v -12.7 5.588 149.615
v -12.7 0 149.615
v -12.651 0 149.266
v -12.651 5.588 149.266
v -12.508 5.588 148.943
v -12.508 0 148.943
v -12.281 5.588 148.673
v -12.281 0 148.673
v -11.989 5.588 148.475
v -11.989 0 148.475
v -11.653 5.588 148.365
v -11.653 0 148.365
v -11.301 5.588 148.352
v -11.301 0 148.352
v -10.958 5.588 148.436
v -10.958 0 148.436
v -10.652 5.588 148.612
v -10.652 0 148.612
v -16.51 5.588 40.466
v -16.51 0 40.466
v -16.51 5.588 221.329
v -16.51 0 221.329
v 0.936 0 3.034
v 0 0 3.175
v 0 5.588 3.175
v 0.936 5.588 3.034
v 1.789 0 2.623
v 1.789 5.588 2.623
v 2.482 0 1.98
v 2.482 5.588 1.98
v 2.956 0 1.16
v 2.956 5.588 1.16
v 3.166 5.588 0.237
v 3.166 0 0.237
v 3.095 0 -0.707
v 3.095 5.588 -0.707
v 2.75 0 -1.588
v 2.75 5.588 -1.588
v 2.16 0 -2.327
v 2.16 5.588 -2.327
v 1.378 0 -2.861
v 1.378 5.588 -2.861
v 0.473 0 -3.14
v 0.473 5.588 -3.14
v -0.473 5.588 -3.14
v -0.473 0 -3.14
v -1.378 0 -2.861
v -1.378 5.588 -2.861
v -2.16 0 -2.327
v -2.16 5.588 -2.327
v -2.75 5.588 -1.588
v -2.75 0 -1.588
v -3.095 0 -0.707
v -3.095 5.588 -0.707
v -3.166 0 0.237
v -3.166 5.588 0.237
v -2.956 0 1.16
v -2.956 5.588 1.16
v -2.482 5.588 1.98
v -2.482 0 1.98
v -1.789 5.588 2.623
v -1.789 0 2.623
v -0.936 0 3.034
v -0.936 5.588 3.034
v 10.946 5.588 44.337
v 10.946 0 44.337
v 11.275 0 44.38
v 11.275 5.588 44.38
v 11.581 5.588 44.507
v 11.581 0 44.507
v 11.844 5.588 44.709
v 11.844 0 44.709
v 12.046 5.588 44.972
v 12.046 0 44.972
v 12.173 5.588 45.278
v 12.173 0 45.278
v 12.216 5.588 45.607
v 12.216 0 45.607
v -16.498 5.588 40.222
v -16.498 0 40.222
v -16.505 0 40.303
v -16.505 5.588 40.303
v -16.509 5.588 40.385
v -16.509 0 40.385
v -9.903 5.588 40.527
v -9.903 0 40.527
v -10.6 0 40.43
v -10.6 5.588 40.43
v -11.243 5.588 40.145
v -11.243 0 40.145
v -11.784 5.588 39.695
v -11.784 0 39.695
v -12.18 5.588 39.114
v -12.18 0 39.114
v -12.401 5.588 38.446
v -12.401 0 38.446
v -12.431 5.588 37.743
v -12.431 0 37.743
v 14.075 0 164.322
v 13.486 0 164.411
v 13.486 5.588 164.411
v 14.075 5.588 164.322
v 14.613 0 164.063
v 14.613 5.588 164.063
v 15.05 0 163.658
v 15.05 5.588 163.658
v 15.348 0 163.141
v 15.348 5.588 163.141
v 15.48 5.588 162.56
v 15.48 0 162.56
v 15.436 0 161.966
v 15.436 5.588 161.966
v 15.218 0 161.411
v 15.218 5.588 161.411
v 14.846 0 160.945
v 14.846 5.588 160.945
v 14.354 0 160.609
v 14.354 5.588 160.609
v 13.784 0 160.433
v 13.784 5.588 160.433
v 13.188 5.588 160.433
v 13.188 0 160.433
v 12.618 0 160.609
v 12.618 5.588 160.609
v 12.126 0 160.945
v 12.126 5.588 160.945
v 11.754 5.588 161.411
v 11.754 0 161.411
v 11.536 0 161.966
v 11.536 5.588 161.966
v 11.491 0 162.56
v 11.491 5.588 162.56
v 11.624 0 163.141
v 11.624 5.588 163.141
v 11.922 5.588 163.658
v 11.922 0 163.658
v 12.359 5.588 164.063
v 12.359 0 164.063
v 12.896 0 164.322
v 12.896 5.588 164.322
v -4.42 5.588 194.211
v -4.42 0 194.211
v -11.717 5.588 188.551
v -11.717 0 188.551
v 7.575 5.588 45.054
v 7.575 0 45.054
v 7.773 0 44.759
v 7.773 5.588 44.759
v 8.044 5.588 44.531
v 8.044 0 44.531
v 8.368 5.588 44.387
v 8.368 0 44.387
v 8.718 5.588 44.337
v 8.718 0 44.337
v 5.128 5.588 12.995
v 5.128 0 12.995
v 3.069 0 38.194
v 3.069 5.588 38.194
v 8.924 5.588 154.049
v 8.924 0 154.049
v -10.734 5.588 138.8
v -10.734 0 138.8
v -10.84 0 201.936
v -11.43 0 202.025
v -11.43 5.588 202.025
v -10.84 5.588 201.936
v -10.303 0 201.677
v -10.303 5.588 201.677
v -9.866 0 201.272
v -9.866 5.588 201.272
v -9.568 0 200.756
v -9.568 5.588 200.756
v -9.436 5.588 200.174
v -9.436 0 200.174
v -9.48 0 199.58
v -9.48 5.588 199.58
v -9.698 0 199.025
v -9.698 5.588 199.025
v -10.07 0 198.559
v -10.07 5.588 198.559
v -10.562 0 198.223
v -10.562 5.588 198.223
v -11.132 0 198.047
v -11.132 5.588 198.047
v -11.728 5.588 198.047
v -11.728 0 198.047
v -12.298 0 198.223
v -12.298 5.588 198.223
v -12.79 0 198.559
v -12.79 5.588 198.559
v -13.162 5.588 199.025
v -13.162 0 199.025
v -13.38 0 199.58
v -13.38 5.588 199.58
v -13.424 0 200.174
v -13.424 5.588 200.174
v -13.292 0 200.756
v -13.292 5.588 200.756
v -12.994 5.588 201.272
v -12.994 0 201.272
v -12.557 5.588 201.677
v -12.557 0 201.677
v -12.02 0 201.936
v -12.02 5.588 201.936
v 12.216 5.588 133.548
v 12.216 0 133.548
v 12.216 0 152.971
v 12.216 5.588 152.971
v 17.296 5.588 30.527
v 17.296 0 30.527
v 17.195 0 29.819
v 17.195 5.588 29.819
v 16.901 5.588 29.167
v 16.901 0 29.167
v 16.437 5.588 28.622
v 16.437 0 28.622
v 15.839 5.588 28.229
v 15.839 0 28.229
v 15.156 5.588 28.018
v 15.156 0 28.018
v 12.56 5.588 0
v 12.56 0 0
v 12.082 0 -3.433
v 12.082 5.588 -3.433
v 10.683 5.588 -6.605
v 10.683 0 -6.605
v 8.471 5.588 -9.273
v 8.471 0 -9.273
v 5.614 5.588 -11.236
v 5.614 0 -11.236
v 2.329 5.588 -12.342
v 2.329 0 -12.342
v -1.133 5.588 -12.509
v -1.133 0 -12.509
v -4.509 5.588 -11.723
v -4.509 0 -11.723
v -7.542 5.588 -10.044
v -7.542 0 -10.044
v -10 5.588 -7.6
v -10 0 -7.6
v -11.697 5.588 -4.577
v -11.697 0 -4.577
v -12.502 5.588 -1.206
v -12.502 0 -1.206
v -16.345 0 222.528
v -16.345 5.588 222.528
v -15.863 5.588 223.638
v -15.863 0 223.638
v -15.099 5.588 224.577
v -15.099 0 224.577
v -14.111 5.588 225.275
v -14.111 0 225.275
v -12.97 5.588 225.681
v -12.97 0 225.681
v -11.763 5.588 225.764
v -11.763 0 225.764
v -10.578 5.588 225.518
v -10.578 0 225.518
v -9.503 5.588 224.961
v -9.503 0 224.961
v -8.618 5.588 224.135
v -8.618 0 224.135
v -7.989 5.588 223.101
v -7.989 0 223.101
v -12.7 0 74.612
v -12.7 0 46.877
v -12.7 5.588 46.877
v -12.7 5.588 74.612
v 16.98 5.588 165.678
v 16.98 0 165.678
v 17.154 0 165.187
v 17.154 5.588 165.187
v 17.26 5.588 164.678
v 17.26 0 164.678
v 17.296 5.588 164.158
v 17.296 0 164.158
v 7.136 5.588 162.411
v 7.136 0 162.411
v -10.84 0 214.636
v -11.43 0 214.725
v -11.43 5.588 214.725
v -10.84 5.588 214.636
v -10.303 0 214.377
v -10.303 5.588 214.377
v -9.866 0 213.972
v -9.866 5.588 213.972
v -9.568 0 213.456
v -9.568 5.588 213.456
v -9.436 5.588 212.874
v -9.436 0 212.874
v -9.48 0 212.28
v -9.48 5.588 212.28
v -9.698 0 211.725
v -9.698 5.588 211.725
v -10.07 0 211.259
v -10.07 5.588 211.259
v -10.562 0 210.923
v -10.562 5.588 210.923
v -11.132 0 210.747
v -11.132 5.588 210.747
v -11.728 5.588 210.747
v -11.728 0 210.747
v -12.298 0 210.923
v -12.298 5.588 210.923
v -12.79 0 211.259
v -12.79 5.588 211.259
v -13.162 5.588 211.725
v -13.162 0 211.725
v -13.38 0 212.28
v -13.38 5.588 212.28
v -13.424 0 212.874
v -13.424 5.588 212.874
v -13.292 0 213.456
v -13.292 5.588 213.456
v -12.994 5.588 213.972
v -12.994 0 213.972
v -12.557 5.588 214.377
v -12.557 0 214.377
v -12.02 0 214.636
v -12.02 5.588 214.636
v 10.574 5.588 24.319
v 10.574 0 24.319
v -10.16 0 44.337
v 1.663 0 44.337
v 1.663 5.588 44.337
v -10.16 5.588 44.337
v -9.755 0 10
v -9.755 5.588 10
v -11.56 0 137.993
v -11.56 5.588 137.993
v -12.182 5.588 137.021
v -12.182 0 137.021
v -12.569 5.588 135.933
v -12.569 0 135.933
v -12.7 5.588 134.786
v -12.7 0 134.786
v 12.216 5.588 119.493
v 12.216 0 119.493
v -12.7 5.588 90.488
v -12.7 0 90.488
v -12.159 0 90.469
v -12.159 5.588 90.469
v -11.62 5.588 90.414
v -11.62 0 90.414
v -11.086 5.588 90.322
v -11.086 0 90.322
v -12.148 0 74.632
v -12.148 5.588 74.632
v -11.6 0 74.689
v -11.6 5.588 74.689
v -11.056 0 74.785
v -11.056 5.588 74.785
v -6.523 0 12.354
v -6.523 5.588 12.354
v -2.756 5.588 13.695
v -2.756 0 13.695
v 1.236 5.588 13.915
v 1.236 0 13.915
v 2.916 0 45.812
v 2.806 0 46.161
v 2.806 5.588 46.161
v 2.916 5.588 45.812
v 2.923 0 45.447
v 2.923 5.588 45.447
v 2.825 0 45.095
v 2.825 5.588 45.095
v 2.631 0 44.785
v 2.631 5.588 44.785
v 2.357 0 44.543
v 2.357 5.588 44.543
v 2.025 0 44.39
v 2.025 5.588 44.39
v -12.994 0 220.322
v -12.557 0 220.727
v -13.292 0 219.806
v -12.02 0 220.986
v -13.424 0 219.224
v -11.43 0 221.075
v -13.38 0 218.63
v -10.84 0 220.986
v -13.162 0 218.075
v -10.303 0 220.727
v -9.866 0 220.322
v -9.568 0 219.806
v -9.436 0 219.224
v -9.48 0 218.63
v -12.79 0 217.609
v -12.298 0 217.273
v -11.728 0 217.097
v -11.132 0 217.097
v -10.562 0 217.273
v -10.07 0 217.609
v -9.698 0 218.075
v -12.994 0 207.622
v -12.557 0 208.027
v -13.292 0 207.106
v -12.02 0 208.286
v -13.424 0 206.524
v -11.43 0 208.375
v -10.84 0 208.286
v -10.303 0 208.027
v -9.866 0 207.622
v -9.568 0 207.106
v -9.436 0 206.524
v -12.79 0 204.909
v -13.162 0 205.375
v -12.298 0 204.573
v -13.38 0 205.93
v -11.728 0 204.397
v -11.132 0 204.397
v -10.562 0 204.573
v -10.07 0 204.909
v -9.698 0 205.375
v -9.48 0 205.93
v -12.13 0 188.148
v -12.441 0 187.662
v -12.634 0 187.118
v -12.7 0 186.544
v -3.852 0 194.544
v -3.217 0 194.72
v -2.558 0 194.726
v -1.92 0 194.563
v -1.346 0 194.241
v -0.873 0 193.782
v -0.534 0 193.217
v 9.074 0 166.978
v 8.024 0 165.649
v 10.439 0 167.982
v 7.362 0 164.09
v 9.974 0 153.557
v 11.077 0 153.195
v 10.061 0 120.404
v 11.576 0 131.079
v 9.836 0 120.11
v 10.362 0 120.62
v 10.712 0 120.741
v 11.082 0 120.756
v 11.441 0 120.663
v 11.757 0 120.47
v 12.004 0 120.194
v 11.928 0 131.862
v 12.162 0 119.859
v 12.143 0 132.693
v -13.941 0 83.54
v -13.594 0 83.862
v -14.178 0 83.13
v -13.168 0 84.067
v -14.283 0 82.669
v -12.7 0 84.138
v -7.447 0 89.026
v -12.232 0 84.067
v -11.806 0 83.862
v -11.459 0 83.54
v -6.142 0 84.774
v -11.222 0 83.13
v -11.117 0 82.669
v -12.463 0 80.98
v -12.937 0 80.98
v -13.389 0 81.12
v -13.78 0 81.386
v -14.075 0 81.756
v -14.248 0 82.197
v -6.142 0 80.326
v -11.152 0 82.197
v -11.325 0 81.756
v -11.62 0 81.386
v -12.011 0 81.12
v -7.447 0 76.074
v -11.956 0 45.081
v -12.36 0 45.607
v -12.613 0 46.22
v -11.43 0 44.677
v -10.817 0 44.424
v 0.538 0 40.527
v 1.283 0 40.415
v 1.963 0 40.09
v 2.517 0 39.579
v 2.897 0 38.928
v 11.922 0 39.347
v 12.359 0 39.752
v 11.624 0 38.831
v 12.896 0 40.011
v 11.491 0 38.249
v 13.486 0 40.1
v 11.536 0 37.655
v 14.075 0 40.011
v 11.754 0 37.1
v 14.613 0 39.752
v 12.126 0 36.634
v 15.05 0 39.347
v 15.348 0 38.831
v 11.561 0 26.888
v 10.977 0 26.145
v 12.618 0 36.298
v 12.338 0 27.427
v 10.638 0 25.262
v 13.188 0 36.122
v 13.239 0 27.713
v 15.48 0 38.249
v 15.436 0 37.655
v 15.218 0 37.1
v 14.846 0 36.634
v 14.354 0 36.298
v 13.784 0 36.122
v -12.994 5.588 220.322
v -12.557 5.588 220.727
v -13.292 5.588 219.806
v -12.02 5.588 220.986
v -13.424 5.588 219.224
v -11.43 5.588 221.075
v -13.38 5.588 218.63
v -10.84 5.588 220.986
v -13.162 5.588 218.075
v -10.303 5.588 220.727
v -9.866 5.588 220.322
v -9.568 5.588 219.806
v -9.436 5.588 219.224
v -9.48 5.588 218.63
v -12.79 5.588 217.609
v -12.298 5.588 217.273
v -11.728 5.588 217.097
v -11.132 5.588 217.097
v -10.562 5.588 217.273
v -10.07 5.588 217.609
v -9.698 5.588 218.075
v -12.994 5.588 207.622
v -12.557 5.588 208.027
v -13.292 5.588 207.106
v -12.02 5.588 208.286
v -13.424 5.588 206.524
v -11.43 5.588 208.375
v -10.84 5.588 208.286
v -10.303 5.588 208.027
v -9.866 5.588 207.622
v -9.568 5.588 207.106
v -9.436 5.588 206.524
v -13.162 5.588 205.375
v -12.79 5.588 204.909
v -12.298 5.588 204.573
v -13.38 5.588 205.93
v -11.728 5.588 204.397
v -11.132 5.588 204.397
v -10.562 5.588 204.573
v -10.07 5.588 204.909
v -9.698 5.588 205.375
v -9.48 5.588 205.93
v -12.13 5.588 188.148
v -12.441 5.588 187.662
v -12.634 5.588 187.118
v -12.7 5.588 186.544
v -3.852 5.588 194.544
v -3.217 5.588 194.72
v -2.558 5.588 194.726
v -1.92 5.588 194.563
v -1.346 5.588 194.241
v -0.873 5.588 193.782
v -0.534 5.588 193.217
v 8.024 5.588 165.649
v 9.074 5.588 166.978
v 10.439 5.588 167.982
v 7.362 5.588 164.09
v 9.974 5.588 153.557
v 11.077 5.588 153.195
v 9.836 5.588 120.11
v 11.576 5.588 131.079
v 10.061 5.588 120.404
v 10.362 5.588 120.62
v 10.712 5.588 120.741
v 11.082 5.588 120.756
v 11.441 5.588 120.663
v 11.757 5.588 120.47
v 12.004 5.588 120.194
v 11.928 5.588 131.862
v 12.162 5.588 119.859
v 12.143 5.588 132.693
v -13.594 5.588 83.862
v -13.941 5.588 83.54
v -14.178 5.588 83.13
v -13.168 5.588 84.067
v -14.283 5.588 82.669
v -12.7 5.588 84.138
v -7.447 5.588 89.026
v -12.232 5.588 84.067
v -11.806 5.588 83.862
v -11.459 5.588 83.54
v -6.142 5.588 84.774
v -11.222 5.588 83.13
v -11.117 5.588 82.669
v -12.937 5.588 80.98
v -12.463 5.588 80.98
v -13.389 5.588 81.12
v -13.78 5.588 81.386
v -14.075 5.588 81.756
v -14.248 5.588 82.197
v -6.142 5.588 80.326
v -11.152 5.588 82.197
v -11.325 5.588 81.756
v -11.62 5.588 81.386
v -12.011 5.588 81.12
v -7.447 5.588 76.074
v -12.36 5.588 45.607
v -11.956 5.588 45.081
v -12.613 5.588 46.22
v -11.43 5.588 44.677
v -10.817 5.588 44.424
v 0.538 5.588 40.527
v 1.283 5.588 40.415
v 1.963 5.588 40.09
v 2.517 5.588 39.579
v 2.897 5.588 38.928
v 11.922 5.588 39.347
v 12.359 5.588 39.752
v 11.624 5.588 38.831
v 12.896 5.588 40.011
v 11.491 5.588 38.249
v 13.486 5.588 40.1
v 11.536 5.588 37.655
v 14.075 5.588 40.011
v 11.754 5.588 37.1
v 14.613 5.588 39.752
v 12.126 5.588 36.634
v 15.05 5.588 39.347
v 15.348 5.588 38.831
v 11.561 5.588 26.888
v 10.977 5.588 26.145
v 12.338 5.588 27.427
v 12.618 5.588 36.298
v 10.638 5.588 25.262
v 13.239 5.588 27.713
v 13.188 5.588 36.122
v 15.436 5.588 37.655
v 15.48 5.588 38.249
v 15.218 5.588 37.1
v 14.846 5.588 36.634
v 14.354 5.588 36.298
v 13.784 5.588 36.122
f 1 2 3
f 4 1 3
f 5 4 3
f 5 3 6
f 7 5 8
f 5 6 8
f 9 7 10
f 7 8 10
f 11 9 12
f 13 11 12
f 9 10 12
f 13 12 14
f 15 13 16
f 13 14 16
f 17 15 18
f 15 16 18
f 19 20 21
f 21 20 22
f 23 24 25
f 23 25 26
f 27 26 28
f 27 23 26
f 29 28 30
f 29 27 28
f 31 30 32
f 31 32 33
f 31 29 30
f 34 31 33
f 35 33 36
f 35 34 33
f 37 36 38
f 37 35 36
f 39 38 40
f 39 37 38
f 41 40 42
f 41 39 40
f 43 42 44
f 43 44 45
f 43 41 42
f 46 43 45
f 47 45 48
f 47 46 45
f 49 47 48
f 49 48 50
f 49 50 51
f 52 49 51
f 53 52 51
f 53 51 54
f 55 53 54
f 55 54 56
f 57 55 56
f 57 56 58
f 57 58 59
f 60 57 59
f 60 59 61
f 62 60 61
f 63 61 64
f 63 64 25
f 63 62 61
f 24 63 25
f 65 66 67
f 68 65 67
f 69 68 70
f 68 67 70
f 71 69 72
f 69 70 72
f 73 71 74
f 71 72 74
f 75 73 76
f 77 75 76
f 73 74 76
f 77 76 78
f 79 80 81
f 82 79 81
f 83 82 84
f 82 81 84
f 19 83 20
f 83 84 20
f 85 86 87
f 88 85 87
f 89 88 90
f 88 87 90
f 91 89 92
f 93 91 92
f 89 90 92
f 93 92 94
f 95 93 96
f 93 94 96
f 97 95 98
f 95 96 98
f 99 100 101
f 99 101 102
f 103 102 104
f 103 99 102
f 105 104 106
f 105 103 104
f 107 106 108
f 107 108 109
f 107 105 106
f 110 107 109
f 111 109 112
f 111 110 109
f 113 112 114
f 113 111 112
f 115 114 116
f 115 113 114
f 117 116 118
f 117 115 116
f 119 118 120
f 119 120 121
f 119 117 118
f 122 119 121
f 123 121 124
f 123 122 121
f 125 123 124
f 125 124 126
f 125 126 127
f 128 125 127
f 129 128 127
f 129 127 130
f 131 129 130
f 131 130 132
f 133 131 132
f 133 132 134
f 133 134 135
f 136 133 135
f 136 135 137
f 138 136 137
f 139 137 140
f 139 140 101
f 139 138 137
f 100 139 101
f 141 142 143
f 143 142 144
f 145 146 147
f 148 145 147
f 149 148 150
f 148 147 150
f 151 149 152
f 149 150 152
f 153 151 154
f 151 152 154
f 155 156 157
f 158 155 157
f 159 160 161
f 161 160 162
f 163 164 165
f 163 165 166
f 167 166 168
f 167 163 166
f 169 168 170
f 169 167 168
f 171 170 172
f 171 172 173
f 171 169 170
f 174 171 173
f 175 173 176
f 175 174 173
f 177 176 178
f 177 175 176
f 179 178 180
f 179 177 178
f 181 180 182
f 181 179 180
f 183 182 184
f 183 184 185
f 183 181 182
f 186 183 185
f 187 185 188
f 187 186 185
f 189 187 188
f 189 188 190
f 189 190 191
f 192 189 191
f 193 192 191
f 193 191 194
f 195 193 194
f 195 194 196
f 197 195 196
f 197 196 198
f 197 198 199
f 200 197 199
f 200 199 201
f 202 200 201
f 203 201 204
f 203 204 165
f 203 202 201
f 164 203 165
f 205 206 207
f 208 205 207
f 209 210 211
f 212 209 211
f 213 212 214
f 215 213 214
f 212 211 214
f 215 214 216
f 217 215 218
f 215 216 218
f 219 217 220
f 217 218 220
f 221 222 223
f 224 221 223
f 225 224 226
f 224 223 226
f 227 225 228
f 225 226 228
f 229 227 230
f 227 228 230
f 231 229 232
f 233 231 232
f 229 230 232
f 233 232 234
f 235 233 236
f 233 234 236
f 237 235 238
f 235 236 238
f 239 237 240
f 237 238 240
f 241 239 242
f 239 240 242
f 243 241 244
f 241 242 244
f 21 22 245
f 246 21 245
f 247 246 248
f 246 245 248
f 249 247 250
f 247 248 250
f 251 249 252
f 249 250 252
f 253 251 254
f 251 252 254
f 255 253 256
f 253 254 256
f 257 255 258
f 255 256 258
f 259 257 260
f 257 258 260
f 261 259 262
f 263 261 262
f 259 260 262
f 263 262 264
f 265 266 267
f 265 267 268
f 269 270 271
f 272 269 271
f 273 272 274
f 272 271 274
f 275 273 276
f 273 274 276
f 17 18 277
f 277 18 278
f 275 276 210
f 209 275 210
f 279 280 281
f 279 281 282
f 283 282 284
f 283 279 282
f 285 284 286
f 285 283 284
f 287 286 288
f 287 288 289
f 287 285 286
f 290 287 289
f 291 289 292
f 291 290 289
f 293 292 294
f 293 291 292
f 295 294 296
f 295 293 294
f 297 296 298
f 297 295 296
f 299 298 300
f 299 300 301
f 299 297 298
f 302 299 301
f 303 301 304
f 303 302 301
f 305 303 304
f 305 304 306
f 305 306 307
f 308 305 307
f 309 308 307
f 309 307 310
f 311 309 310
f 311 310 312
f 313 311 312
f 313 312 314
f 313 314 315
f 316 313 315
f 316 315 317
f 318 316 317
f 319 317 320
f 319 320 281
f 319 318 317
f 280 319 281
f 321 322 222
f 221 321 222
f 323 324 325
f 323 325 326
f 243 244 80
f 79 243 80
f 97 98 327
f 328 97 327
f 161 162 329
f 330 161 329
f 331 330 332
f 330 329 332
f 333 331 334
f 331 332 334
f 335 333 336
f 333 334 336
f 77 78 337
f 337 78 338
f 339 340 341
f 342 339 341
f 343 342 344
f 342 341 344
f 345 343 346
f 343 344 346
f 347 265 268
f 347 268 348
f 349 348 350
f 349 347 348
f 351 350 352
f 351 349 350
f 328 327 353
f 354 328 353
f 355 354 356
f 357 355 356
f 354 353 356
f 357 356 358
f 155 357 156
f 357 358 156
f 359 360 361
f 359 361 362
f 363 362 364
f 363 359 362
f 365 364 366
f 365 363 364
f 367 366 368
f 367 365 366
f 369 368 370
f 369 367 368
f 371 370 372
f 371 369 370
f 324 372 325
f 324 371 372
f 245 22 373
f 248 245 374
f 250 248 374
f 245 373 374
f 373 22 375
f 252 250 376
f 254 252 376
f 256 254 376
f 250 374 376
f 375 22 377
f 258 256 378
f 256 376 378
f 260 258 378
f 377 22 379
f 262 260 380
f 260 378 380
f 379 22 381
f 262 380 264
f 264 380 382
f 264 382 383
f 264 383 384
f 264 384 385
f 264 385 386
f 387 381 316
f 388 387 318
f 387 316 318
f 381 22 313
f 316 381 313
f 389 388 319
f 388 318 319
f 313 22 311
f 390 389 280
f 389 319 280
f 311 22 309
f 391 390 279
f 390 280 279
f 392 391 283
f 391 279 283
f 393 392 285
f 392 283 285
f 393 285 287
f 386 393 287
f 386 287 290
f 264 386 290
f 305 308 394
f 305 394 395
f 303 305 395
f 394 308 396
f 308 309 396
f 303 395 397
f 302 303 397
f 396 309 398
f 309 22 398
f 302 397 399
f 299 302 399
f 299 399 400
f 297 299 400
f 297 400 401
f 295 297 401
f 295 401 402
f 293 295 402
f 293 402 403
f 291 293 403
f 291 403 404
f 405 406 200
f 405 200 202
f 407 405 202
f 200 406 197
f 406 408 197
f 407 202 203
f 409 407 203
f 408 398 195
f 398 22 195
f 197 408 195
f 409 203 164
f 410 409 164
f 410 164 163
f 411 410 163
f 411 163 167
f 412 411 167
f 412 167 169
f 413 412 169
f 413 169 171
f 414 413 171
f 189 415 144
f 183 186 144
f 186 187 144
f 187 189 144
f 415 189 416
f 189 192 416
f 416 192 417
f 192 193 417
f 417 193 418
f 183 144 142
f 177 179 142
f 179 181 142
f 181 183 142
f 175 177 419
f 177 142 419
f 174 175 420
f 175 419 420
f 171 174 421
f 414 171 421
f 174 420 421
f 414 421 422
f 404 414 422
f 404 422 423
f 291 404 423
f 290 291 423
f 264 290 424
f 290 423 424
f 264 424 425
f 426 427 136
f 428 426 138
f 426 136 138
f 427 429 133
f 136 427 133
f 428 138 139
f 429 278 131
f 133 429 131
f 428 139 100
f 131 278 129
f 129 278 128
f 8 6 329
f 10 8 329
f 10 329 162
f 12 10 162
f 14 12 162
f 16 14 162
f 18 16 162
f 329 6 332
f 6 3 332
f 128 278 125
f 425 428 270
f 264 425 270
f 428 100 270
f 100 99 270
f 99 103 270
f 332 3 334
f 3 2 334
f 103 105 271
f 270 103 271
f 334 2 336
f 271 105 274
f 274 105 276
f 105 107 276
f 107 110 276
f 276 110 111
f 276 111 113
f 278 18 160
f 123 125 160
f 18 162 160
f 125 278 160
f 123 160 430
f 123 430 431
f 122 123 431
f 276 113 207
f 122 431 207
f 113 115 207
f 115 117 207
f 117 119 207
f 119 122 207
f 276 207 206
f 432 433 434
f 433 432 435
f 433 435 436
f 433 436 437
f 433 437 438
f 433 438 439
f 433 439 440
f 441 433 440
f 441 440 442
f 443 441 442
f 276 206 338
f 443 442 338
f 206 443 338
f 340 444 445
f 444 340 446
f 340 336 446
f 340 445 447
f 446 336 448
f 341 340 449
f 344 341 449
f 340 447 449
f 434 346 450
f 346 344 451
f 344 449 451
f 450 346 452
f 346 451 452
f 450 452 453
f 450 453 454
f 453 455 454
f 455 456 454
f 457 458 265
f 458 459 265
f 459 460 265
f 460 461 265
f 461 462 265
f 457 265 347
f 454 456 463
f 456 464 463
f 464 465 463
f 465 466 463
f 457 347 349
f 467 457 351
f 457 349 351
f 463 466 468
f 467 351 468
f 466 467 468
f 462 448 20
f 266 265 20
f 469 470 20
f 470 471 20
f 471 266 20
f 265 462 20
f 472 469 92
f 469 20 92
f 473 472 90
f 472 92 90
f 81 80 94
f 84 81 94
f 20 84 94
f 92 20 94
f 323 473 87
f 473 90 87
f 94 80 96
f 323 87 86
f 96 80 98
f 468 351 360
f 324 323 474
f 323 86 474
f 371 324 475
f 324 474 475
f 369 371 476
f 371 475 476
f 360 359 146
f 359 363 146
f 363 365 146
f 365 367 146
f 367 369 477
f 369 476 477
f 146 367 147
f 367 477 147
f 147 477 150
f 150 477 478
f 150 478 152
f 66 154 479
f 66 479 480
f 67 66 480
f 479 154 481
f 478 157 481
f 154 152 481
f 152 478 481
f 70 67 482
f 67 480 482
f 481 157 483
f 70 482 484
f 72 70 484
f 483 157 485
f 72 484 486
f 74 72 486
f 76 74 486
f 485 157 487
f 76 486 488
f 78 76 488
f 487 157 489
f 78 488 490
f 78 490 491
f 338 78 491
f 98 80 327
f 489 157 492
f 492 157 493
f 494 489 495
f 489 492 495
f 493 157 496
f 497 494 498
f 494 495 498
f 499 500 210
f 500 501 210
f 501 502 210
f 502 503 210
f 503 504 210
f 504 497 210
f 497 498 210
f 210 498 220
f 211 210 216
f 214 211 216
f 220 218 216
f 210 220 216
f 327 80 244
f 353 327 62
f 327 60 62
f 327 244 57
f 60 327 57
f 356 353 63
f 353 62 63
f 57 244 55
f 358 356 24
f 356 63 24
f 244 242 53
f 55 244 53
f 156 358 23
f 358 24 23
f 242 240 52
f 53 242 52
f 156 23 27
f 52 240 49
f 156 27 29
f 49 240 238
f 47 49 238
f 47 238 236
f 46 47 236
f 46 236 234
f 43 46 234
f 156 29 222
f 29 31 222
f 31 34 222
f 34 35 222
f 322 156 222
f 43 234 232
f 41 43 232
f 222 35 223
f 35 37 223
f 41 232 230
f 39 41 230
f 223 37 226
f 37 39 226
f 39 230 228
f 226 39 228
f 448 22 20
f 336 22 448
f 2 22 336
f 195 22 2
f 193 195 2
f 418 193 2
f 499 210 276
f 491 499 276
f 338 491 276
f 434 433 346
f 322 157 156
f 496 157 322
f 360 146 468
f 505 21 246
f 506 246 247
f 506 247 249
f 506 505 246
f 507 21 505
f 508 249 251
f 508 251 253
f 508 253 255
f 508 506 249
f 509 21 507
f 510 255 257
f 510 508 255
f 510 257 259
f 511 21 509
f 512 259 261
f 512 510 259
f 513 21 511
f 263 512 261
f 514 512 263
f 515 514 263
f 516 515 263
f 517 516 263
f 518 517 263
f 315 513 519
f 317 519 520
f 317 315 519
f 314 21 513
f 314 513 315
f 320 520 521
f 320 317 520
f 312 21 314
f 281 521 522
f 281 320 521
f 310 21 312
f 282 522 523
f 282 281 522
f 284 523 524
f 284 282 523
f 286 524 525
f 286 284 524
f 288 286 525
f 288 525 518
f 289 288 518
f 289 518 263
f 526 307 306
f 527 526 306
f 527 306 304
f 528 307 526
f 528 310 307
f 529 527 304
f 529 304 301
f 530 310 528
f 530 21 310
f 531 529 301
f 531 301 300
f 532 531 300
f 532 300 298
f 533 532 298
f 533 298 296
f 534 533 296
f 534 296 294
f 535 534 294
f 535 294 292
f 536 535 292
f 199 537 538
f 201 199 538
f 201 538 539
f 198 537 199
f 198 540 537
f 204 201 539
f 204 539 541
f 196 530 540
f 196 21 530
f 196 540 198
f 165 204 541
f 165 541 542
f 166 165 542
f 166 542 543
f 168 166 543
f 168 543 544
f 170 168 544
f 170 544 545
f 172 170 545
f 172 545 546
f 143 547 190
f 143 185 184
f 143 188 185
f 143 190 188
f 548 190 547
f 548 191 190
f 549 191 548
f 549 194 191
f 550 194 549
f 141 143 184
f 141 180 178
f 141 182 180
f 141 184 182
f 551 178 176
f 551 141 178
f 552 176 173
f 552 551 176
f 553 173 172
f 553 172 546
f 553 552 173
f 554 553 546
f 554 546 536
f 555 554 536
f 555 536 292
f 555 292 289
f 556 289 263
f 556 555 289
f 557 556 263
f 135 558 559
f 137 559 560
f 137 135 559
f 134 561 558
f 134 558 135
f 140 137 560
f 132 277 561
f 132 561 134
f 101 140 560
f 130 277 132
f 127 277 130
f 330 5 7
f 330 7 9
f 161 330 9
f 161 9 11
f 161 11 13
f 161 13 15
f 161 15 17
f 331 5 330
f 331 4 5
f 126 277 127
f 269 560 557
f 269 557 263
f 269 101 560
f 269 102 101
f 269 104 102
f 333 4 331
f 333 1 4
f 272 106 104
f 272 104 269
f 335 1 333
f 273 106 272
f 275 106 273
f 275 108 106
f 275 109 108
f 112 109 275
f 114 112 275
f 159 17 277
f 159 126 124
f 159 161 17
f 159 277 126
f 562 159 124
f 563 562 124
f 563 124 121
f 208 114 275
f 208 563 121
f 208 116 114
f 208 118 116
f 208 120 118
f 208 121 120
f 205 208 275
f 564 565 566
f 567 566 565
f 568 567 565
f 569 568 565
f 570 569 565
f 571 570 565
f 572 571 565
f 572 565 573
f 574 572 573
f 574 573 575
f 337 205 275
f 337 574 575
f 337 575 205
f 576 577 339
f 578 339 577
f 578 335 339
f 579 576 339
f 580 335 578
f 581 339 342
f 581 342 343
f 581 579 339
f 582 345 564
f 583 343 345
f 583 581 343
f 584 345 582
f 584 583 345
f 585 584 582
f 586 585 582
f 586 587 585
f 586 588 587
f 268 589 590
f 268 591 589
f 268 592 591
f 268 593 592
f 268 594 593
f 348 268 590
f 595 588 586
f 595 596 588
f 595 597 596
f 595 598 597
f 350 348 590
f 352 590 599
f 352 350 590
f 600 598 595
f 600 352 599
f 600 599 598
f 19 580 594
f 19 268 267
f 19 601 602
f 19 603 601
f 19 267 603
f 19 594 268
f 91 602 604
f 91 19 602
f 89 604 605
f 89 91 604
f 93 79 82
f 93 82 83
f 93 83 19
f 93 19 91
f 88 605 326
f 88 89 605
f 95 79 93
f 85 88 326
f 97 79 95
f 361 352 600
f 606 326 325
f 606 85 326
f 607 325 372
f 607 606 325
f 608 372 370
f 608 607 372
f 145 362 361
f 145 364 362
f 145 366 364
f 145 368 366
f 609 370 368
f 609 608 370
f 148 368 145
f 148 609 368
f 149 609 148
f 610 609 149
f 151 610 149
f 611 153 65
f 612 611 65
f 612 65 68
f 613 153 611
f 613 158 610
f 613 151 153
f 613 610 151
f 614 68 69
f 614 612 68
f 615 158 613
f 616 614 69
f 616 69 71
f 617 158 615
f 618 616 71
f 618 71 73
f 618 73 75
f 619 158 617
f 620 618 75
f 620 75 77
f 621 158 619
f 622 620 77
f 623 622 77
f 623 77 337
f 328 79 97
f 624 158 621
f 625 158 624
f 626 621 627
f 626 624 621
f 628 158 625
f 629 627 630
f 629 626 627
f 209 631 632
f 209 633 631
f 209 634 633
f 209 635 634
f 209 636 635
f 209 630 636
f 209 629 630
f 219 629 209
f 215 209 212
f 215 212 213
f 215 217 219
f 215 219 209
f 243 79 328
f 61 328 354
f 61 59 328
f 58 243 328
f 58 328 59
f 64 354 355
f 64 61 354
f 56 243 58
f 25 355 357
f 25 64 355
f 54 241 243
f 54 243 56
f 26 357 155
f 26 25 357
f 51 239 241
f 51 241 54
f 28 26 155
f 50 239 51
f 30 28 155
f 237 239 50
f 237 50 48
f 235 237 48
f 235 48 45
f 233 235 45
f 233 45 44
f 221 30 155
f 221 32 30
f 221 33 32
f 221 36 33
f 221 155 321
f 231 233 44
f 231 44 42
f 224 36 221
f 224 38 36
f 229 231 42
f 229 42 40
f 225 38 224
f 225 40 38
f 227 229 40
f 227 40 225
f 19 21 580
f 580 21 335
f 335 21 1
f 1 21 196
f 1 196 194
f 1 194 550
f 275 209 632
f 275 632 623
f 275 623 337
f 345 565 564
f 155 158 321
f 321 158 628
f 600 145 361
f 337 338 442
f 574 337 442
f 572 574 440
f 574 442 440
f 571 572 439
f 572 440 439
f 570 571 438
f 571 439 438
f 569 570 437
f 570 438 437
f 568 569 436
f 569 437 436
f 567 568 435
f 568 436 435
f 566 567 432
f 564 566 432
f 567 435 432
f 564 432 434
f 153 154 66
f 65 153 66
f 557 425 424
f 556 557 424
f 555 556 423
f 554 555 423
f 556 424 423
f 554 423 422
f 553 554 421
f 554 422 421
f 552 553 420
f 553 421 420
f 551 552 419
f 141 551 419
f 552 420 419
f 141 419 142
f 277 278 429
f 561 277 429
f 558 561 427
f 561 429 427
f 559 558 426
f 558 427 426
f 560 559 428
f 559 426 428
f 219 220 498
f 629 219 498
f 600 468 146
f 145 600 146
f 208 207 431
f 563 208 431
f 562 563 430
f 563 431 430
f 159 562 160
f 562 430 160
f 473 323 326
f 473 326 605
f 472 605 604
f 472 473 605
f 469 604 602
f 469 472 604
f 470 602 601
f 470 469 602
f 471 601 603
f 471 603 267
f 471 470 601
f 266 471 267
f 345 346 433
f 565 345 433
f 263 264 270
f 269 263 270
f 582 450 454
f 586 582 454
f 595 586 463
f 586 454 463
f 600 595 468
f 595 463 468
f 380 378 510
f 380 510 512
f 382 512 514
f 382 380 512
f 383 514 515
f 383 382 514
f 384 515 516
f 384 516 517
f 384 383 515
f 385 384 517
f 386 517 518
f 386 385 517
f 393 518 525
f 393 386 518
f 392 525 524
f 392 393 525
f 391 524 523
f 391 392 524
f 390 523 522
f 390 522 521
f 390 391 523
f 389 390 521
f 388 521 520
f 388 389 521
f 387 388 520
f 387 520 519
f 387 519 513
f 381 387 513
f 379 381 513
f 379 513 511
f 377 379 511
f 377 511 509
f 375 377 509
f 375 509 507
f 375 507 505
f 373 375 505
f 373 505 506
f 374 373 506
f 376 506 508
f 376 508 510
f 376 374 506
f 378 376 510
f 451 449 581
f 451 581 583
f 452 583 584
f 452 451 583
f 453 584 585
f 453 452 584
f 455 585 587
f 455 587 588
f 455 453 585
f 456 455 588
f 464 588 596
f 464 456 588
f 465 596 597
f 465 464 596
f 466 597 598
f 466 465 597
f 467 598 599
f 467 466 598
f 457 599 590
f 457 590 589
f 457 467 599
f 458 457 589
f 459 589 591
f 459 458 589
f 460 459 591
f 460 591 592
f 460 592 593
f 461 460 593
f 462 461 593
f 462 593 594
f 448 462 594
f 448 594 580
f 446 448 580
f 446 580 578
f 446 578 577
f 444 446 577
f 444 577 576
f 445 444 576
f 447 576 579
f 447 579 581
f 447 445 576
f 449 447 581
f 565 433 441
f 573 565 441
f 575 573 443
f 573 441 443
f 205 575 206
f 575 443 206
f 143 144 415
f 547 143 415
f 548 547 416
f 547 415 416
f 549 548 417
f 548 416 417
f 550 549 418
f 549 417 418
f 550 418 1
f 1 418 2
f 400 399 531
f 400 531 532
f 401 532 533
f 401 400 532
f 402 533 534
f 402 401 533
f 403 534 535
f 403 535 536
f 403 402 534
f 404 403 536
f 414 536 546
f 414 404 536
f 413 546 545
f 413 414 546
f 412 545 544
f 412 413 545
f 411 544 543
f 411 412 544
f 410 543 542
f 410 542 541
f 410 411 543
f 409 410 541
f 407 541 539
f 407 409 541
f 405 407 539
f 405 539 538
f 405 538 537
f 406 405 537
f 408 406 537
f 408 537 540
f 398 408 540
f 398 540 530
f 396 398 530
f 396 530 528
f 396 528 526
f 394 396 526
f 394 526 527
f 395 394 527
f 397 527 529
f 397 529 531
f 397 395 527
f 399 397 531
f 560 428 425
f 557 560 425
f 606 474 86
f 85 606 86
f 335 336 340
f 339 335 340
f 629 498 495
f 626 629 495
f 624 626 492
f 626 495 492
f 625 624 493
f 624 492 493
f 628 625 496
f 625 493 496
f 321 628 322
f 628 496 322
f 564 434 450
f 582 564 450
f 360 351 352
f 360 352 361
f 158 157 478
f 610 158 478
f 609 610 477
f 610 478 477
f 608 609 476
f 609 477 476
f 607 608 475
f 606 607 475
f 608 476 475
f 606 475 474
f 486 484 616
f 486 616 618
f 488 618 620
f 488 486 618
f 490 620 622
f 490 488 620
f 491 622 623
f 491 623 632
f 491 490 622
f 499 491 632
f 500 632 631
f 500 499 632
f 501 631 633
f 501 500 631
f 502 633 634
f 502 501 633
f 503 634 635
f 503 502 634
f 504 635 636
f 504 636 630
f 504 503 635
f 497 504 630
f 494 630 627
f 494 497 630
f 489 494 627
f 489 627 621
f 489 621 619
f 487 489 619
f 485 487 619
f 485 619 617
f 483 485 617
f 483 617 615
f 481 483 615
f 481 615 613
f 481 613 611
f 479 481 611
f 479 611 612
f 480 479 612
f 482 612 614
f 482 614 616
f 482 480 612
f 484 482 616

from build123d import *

# Parameters (mm, degrees)
SKETCH2_R           = 3.175
SKETCH2_R_2         = 2
SKETCH2_R_3         = 1.5875
SKETCH2_R_4         = 1.999999991
BOSS_EXTRUDE1_DEPTH = 5.588


with BuildPart() as part:
    # Sketch2 → Boss-Extrude1 (new body)
    with BuildSketch(Plane(origin=(0, 0, 0), x_dir=(1, 0, 0), z_dir=(0, 1, 0))):
        with BuildLine():
            Line((15.15555913, -28.018449791), (13.238676936, -27.713033224))
            ThreePointArc((13.238676936, -27.713033224), (11.241051513, -26.538356195), (10.573787778, -24.319092227))
            Line((10.573787778, -24.319092227), (12.5603, 0))
            ThreePointArc((12.5603, 0), (0.603657177, 12.545785512), (-12.502275592, 1.2059192))
            Line((-12.502275592, 1.2059192), (-16.498266045, -40.222207921))
            ThreePointArc((-16.498266045, -40.222207921), (-16.507064815, -40.344000039), (-16.51, -40.466074291))
            Line((-16.51, -40.466074291), (-16.51, -221.328861788))
            ThreePointArc((-16.51, -221.328861788), (-12.970187584, -225.680718913), (-7.988667969, -223.101301399))
            Line((-7.988667969, -223.101301399), (16.979901226, -165.677523619))
            ThreePointArc((16.979901226, -165.677523619), (17.216065593, -164.934164738), (17.295902343, -164.158289667))
            Line((17.295902343, -164.158289667), (17.295902343, -30.526810701))
            ThreePointArc((17.295902343, -30.526810701), (16.688093876, -28.878103365), (15.15555913, -28.018449791))
        make_face()
        with Locations(Location((0, 0, 0), (0, 0, 270))):
            Circle(SKETCH2_R, mode=Mode.SUBTRACT)
        with Locations(Location((-11.43, -219.075, 0), (0, 0, 270))):
            Circle(SKETCH2_R_2, mode=Mode.SUBTRACT)
        with Locations(Location((-11.43, -212.725, 0), (0, 0, 270))):
            Circle(SKETCH2_R_2, mode=Mode.SUBTRACT)
        with Locations(Location((-11.43, -206.375, 0), (0, 0, 270))):
            Circle(SKETCH2_R_2, mode=Mode.SUBTRACT)
        with Locations(Location((-11.43, -200.025, 0), (0, 0, 270))):
            Circle(SKETCH2_R_2, mode=Mode.SUBTRACT)
        with Locations(Location((-12.7, -82.55, 0), (0, 0, 270))):
            Circle(SKETCH2_R_3, mode=Mode.SUBTRACT)
        with Locations(Location((13.485902343, -38.1, 0), (0, 0, 270))):
            Circle(SKETCH2_R_4, mode=Mode.SUBTRACT)
        with Locations(Location((13.485902343, -162.410770806, 0), (0, 0, 270))):
            Circle(SKETCH2_R_2, mode=Mode.SUBTRACT)
        with BuildLine():
            Line((10.438542905, -167.981776143), (-0.534170778, -193.217289931))
            ThreePointArc((-0.534170778, -193.217289931), (-2.234040931, -194.665234867), (-4.420389569, -194.211381682))
            Line((-4.420389569, -194.211381682), (-11.716886202, -188.551043102))
            ThreePointArc((-11.716886202, -188.551043102), (-12.441018517, -187.661516081), (-12.7, -186.544128716))
            Line((-12.7, -186.544128716), (-12.7, -149.615408258))
            ThreePointArc((-12.7, -149.615408258), (-11.988693683, -148.474898999), (-10.651556899, -148.611951065))
            Line((-10.651556899, -148.611951065), (7.135902343, -162.410770806))
            ThreePointArc((7.135902343, -162.410770806), (8.023611961, -165.648962244), (10.438542905, -167.981776143))
        make_face(mode=Mode.SUBTRACT)
        with BuildLine():
            Line((-7.44734835, -76.074408803), (7.575478058, -45.053638233))
            ThreePointArc((7.575478058, -45.053638233), (8.043996088, -44.531101035), (8.718495671, -44.337182032))
            Line((8.718495671, -44.337182032), (10.945902343, -44.337182032))
            ThreePointArc((10.945902343, -44.337182032), (11.843927955, -44.70915642), (12.215902343, -45.607182032))
            Line((12.215902343, -45.607182032), (12.215902343, -119.492817968))
            ThreePointArc((12.215902343, -119.492817968), (11.264685124, -120.722158254), (9.835937715, -120.109971535))
            Line((9.835937715, -120.109971535), (-7.44734835, -89.025591197))
            ThreePointArc((-7.44734835, -89.025591197), (-5.976040897, -82.55), (-7.44734835, -76.074408803))
        make_face(mode=Mode.SUBTRACT)
        with BuildLine():
            Line((-12.431479451, -37.743315662), (-9.755434212, -9.99962016))
            ThreePointArc((-9.755434212, -9.99962016), (-2.756273581, -13.695395429), (5.127655889, -12.99492382))
            Line((5.127655889, -12.99492382), (3.069264048, -38.19397392))
            ThreePointArc((3.069264048, -38.19397392), (2.259083254, -39.854914801), (0.537695935, -40.527182032))
            Line((0.537695935, -40.527182032), (-9.903213406, -40.527182032))
            ThreePointArc((-9.903213406, -40.527182032), (-11.783508673, -39.694838236), (-12.431479451, -37.743315662))
        make_face(mode=Mode.SUBTRACT)
        with BuildLine():
            Line((1.663048834, -44.337182032), (-10.16, -44.337182032))
            ThreePointArc((-10.16, -44.337182032), (-11.956051224, -45.081130808), (-12.7, -46.877182032))
            Line((-12.7, -46.877182032), (-12.7, -74.6125))
            ThreePointArc((-12.7, -74.6125), (-11.873503915, -74.655646925), (-11.055993219, -74.784618621))
            Line((-11.055993219, -74.784618621), (2.806066447, -46.160725831))
            ThreePointArc((2.806066447, -46.160725831), (2.739129831, -44.932682449), (1.663048834, -44.337182032))
        make_face(mode=Mode.SUBTRACT)
        with BuildLine():
            Line((8.923603828, -154.049487576), (-10.733772403, -138.80005889))
            ThreePointArc((-10.733772403, -138.80005889), (-12.182037035, -137.021004847), (-12.7, -134.786230117))
            Line((-12.7, -134.786230117), (-12.7, -90.4875))
            ThreePointArc((-12.7, -90.4875), (-11.888769677, -90.445936399), (-11.086035141, -90.321680879))
            Line((-11.086035141, -90.321680879), (11.575760855, -131.079432803))
            ThreePointArc((11.575760855, -131.079432803), (12.053263487, -132.272915946), (12.215902343, -133.548047069))
            Line((12.215902343, -133.548047069), (12.215902343, -152.970817152))
            ThreePointArc((12.215902343, -152.970817152), (10.520298026, -153.359206519), (8.923603828, -154.049487576))
        make_face(mode=Mode.SUBTRACT)
    extrude(amount=BOSS_EXTRUDE1_DEPTH)


solid = part.part
